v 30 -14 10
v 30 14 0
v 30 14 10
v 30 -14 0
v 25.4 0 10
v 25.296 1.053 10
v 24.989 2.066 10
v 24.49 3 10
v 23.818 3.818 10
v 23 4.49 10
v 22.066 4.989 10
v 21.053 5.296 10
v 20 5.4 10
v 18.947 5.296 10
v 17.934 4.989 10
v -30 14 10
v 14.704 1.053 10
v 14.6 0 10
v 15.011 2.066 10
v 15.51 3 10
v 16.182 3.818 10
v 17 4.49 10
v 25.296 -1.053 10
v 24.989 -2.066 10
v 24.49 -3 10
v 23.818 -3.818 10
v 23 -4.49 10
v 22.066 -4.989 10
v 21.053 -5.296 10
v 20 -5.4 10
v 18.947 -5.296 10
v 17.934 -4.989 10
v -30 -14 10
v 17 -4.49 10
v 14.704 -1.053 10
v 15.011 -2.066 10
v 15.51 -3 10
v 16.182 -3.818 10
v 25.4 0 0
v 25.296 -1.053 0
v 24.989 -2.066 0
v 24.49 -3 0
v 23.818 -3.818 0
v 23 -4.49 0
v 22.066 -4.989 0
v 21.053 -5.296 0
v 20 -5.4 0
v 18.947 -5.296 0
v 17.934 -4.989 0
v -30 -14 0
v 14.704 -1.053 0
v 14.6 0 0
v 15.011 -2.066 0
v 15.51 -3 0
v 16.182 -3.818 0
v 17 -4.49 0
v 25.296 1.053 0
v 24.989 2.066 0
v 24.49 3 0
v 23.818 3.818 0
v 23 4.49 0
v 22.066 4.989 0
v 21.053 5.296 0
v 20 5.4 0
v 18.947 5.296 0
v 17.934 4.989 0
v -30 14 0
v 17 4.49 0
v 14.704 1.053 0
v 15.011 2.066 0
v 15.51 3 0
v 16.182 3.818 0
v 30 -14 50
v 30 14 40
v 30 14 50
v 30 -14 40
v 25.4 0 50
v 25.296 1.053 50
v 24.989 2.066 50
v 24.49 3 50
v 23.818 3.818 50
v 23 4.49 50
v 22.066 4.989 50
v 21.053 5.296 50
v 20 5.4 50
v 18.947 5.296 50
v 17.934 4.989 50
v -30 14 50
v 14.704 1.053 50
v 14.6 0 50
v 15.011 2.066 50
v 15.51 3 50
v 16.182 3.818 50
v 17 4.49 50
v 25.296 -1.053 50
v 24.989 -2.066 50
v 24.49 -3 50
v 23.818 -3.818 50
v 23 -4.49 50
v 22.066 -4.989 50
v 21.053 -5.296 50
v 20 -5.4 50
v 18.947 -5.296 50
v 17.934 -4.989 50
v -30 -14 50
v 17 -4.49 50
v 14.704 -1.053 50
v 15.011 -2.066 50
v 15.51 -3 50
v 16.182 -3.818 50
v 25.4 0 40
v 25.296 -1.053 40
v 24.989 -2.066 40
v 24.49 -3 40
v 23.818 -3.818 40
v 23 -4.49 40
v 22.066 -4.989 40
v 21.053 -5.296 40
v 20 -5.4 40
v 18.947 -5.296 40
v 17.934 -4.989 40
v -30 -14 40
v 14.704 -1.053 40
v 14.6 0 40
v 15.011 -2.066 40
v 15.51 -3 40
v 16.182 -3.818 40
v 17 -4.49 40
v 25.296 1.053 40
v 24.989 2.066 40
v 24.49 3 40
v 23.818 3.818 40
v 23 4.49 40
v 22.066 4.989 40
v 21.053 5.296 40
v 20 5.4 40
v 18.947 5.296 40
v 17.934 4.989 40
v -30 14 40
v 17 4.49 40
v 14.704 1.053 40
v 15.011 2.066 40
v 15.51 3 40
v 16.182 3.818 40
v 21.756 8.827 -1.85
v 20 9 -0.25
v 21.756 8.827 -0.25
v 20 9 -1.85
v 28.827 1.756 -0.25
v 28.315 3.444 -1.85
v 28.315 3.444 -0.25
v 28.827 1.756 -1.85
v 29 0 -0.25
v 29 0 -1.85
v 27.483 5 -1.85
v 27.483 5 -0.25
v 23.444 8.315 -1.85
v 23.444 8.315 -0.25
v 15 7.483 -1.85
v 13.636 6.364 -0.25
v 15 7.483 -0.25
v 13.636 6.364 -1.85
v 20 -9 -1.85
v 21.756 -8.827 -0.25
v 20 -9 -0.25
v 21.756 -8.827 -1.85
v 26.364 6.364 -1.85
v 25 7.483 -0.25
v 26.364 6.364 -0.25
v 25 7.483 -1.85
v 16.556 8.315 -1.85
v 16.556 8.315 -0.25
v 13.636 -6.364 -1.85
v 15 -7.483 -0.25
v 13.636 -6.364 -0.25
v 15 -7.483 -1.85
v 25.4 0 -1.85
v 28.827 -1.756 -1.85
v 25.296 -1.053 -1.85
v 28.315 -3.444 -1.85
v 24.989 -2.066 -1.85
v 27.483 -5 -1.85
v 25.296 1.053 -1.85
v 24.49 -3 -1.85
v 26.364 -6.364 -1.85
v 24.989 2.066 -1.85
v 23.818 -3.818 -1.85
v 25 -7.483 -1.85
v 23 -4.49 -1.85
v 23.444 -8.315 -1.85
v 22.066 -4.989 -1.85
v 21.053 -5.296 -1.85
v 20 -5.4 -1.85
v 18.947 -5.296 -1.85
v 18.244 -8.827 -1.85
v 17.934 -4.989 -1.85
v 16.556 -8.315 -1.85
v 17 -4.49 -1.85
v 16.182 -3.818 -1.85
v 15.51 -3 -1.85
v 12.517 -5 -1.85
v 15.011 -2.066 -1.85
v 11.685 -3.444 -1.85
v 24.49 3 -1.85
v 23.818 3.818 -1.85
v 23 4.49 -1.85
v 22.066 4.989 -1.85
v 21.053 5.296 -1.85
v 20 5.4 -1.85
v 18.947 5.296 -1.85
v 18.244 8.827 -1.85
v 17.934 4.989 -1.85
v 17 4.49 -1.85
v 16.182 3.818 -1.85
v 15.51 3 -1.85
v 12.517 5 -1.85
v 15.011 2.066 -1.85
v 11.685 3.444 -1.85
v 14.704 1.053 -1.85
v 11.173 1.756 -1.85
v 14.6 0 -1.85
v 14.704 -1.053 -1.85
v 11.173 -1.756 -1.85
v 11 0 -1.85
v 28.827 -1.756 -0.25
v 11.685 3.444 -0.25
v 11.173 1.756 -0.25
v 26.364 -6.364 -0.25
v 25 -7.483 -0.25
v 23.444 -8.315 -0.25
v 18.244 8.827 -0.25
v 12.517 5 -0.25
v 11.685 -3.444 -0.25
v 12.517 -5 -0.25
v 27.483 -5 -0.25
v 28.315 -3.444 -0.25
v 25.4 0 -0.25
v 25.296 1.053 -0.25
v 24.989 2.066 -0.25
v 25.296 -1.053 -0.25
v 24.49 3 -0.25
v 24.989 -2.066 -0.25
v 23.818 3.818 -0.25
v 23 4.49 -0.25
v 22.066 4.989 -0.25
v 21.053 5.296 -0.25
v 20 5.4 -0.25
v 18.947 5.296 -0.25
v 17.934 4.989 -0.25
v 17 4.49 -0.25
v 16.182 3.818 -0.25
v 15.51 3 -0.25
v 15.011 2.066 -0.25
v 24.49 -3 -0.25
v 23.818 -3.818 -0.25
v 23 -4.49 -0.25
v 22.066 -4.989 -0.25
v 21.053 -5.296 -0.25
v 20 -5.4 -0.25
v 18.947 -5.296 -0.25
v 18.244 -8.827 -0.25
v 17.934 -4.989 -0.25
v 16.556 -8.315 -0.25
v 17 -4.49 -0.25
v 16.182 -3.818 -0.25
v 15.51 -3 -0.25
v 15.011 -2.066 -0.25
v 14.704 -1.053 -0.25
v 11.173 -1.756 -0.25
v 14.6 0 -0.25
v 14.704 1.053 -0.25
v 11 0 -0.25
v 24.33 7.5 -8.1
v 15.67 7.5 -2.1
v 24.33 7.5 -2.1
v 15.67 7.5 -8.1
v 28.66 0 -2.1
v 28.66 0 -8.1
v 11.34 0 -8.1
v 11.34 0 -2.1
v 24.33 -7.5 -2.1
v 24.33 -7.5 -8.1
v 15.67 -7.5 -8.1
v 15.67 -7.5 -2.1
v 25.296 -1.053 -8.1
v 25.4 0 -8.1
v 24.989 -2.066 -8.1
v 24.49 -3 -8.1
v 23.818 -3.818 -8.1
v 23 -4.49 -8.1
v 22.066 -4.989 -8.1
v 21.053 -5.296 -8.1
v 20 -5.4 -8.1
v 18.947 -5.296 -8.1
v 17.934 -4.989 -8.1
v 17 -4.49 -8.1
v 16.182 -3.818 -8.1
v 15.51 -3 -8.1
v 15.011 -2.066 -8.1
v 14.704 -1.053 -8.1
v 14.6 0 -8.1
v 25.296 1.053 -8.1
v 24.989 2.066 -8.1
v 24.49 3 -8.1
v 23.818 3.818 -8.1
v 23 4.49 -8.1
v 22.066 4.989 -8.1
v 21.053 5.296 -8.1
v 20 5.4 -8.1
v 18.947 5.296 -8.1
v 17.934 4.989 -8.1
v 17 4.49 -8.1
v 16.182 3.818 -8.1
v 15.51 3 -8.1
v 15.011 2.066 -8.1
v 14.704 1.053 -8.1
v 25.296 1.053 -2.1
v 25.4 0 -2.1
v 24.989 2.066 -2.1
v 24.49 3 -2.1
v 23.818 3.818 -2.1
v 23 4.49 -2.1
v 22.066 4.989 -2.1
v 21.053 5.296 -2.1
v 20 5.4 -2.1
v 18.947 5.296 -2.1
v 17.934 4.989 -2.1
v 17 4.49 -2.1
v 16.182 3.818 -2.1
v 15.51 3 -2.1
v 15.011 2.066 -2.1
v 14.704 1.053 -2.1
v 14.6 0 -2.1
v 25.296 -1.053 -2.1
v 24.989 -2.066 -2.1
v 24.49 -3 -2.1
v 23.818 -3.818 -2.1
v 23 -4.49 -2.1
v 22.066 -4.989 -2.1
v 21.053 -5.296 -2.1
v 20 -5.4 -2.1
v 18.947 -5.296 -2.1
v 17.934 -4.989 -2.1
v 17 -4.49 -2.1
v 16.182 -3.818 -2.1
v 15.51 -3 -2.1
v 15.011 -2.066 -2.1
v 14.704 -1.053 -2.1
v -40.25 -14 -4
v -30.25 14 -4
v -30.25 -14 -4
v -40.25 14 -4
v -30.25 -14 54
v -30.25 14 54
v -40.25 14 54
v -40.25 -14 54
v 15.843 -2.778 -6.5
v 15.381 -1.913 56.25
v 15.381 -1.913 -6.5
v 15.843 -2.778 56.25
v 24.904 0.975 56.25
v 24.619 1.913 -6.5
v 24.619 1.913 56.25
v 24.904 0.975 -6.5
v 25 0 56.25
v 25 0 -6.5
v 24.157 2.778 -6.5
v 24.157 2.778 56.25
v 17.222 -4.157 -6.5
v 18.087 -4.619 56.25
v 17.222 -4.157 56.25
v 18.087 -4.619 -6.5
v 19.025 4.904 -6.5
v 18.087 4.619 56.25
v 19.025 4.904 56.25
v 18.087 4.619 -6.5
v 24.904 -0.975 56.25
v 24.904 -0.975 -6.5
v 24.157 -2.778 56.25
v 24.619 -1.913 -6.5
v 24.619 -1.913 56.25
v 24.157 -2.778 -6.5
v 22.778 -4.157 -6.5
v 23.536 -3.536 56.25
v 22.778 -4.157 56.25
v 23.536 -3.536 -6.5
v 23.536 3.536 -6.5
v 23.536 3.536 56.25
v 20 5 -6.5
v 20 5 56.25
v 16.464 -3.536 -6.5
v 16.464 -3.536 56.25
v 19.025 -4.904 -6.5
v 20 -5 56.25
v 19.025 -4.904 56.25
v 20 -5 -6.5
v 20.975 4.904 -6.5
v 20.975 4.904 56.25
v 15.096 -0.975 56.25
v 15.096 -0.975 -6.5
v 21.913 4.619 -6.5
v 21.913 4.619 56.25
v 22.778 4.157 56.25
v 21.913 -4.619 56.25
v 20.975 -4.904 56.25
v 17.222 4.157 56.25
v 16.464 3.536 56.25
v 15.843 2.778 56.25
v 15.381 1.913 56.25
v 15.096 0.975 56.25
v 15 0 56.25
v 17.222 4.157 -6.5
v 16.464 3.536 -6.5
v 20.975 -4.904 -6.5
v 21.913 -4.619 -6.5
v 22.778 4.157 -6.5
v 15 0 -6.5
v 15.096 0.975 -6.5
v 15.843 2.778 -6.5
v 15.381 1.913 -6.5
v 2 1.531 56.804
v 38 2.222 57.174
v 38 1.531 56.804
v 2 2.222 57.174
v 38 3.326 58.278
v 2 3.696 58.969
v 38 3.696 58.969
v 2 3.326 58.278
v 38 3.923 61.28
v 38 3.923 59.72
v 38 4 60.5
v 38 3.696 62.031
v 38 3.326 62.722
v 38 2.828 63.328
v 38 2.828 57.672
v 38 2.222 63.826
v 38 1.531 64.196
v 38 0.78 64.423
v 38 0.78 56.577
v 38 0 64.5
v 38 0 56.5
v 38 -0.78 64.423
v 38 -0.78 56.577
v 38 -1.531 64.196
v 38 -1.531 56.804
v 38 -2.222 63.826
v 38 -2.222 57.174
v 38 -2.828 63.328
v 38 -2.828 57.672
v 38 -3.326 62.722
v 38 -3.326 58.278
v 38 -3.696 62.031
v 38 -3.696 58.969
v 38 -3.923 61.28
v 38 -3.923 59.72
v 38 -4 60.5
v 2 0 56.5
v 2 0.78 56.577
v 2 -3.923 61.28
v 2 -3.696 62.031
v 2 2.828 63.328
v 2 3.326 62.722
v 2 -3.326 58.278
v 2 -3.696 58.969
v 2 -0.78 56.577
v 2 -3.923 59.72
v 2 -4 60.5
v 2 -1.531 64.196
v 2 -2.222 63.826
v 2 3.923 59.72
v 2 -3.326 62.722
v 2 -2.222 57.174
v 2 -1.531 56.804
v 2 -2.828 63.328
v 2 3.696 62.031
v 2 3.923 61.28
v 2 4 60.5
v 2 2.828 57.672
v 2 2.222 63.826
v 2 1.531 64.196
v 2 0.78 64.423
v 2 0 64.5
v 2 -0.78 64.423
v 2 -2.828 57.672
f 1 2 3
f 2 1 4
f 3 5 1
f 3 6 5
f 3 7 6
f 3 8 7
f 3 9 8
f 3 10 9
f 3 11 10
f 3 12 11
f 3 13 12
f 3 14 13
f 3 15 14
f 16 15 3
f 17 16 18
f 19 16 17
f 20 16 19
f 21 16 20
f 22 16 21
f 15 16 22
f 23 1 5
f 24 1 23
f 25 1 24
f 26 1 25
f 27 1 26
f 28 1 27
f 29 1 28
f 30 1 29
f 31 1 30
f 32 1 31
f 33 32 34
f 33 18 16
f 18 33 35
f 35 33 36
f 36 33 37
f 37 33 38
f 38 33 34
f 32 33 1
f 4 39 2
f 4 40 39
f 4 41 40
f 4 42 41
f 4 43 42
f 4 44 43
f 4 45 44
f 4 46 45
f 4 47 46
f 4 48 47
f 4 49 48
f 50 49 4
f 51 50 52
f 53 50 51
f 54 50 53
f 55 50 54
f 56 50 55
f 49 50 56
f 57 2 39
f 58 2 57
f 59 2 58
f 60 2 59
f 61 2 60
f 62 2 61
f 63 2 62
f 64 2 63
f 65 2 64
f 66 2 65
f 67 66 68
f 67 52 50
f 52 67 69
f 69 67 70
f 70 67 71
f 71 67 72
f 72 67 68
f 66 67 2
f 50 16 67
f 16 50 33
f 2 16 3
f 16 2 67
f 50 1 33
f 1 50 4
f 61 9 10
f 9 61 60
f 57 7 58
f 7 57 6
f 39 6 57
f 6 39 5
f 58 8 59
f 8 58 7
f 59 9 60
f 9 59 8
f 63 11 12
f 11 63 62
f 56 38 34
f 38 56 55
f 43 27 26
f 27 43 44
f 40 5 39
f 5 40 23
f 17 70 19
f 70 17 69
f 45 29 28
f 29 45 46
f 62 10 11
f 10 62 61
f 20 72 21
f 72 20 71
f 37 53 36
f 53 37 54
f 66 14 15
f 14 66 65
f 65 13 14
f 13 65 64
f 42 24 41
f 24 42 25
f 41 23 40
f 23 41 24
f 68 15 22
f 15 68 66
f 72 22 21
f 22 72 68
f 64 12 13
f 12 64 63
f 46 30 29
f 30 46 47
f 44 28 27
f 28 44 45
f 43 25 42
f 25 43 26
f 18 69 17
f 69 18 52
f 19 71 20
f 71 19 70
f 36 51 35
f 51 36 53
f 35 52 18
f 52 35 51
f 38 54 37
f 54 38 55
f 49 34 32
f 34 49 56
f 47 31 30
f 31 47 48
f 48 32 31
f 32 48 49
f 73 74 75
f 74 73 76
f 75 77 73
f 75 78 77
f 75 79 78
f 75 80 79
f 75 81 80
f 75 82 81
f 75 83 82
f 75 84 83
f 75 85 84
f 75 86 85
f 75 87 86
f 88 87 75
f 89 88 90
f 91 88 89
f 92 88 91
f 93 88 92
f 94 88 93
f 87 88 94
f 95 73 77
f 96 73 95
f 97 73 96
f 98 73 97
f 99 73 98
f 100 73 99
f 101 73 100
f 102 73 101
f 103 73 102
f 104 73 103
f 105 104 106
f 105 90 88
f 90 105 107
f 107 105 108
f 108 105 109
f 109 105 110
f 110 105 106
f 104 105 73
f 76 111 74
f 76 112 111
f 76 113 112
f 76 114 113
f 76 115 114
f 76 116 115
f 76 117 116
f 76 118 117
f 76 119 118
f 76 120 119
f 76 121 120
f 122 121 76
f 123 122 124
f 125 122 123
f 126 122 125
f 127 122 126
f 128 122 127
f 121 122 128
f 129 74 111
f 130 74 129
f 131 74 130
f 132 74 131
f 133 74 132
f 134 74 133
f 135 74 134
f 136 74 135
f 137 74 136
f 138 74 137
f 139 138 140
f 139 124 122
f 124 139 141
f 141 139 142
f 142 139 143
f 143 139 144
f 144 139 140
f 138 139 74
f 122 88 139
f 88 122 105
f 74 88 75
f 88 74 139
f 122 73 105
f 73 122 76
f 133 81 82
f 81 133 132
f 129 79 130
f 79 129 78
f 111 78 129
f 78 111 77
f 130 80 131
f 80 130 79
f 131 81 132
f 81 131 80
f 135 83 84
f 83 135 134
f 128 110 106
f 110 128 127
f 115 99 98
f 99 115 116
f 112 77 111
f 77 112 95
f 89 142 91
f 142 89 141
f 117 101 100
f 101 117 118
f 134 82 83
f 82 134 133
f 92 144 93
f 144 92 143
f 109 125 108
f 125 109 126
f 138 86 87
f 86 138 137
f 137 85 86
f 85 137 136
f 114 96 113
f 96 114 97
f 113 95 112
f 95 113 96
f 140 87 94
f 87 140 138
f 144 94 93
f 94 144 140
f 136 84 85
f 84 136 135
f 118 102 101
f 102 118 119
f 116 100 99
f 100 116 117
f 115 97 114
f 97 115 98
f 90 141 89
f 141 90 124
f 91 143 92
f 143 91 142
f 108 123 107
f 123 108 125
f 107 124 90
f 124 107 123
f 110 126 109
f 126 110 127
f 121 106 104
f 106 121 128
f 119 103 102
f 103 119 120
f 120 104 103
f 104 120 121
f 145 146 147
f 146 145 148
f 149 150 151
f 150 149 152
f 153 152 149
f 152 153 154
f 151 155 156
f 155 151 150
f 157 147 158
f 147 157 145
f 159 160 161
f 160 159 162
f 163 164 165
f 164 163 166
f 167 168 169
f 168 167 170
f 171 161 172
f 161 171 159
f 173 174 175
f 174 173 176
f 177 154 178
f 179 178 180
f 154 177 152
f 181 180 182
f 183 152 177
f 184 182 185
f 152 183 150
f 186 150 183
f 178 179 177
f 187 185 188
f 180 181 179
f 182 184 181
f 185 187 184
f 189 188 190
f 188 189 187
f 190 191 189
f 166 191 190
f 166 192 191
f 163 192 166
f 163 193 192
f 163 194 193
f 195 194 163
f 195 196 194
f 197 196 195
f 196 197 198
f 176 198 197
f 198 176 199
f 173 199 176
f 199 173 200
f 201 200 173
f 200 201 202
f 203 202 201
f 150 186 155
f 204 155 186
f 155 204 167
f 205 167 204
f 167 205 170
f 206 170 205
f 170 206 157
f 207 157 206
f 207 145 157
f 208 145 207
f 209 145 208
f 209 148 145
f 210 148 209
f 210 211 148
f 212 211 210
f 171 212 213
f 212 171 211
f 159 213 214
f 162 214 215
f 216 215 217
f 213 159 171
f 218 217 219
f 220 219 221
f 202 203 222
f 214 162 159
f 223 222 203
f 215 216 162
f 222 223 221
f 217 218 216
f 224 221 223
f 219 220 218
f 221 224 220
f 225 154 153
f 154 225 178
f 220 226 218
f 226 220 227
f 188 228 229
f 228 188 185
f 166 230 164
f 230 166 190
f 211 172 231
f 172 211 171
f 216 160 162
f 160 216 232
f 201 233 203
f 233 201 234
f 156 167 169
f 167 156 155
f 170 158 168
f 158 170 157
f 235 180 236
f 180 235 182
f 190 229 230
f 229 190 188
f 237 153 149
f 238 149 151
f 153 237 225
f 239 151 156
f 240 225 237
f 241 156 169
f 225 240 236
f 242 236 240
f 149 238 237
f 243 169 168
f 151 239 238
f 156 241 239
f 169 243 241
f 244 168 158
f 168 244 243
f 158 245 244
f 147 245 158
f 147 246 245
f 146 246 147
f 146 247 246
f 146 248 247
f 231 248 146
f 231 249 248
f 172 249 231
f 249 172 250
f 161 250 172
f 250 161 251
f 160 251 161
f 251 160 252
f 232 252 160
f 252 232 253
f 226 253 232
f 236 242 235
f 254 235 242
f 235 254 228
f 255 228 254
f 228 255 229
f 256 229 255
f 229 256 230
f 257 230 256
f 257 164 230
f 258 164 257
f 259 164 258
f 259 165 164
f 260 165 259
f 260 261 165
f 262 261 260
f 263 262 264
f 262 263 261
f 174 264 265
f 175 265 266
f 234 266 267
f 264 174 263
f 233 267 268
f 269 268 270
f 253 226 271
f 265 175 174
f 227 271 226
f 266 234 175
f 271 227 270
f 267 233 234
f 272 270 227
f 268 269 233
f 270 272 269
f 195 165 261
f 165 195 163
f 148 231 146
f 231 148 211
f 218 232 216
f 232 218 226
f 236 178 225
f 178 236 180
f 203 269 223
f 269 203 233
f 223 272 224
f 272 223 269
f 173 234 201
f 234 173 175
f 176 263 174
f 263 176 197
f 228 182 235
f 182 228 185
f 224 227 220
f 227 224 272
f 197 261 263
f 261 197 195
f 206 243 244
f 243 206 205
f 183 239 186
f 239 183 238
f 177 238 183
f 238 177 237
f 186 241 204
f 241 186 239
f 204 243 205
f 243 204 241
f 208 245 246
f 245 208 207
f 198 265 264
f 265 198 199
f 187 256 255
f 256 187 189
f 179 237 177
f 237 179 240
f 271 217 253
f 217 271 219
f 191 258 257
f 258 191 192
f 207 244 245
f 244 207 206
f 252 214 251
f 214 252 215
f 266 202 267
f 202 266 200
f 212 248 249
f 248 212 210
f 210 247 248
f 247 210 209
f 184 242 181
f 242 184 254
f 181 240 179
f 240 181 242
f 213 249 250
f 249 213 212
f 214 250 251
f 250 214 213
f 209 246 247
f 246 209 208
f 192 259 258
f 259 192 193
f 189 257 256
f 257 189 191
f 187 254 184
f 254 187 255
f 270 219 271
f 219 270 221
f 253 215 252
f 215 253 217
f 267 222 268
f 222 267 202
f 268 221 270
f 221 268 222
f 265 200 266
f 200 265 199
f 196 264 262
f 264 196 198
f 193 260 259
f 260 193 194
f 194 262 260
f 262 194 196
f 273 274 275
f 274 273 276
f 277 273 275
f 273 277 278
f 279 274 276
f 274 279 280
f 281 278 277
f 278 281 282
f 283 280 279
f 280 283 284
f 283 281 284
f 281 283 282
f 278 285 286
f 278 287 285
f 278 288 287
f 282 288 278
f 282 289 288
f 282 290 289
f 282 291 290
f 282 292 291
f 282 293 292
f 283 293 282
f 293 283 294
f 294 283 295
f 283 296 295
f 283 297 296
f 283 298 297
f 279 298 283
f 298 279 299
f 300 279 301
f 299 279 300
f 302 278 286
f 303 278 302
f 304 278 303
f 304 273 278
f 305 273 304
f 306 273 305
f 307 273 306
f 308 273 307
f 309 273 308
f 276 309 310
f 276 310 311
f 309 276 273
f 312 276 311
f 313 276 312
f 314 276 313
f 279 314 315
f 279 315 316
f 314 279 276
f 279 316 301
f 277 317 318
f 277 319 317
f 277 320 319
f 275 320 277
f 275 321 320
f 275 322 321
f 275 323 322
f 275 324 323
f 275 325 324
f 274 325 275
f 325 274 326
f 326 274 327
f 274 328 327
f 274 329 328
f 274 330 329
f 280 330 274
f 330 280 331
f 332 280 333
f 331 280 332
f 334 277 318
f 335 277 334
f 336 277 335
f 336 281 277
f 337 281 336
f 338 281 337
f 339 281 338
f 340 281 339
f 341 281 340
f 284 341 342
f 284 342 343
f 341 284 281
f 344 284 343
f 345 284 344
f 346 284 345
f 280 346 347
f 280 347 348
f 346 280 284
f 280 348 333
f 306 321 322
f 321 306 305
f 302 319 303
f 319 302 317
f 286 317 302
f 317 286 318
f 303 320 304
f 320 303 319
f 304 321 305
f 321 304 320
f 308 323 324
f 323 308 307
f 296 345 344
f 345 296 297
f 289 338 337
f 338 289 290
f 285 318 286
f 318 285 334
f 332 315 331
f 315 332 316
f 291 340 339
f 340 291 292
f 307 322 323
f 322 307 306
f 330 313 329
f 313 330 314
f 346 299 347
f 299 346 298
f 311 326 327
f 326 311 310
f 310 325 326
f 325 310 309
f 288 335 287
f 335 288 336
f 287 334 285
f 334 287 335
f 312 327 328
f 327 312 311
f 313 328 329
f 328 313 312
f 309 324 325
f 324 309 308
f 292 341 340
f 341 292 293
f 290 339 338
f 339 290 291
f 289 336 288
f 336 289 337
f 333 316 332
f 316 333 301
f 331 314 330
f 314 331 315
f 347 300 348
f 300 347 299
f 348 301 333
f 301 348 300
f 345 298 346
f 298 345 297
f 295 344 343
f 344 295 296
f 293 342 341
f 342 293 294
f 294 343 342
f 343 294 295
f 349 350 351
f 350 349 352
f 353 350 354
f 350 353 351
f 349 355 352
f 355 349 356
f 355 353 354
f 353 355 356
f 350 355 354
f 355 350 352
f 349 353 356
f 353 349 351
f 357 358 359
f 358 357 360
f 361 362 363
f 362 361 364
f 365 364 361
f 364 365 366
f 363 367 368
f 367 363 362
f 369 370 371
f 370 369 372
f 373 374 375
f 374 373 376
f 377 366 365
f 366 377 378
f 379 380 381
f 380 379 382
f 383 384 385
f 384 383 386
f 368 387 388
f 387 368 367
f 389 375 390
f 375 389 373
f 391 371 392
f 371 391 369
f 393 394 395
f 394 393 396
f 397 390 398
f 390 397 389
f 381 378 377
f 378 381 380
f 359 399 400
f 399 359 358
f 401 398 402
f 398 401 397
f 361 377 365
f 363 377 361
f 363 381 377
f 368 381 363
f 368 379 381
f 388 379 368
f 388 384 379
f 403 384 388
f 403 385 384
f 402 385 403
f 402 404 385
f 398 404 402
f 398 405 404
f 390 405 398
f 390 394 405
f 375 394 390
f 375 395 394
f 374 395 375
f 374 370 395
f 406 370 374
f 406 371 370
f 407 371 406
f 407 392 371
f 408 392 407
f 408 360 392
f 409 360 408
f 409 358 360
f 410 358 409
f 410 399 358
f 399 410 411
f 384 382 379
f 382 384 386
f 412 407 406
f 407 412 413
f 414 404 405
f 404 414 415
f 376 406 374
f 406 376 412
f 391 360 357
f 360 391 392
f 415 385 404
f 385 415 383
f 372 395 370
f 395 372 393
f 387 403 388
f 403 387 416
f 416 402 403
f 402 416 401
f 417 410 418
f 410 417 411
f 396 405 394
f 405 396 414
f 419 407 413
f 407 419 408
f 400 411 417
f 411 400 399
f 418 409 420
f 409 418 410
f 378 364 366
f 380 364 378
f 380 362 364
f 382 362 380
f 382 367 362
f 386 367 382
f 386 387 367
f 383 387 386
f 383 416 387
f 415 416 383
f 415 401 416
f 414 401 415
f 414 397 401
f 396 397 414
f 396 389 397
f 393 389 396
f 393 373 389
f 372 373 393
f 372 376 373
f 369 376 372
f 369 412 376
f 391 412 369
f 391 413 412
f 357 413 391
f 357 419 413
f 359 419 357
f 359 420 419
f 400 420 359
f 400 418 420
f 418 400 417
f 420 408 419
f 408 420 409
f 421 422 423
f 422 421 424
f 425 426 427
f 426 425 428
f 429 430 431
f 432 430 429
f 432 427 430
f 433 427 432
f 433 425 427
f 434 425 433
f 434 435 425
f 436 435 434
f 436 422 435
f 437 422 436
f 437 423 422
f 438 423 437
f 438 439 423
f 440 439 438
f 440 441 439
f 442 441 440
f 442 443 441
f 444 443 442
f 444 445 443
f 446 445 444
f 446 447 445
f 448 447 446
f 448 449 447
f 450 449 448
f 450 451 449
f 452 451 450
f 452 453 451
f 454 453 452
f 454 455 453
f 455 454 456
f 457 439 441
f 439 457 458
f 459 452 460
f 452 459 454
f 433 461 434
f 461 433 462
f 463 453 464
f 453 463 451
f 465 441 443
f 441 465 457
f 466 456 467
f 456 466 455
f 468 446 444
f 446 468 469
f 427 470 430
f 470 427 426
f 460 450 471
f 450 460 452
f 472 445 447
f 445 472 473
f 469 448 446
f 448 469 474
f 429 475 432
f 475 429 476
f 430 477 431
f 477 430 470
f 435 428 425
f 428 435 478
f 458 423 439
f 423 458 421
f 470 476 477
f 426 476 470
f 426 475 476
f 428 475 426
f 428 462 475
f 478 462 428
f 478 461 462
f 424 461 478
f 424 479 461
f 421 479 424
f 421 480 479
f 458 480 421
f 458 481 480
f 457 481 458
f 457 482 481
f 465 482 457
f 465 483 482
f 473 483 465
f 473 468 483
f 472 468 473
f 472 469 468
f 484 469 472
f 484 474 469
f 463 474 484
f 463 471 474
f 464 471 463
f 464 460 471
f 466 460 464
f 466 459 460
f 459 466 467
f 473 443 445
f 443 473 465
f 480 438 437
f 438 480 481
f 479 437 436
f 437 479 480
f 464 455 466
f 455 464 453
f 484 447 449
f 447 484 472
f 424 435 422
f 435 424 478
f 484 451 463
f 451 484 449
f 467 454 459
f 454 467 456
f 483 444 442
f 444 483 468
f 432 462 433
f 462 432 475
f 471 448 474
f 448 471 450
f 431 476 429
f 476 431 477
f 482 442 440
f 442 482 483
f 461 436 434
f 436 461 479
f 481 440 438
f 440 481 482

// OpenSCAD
$fn = 32;

// ------------------------------------------------------------------------
// C clamp: throat 40 mm, screw d10
// Every part is its own module, assembly() places every instance.
// ------------------------------------------------------------------------

// --- part 1 ---
module clamp_arm() {
  difference() {
    translate([-30, -14, 0]) cube([60, 28, 10]);
    translate([20, 0, -1]) cylinder(h = 12, d = 10.8);
  }
}

// --- part 2 ---
module clamp_spine() {
  difference() {
    translate([-29, -14, 0]) cube([58, 28, 10]);
  }
}

// --- part 3 ---
module clamp_screw() {
  translate([0, 0, -31.375]) cylinder(h = 62.75, d = 10);
}

// --- part 4 ---
module clamp_washer() {
  difference() {
      translate([0, 0, 0]) cylinder(h = 1.6, d = 18);
      translate([0, 0, -1]) cylinder(h = 3.6, d = 10.8);
    }
}

// --- part 5 ---
module clamp_nut() {
  difference() {
    linear_extrude(height = 6) polygon(points = [[8.66, 0], [4.33, 7.5], [-4.33, 7.5], [-8.66, 0], [-4.33, -7.5], [4.33, -7.5]]);
    translate([0, 0, -1]) cylinder(h = 8, d = 10.8);
  }
}

// --- part 6 ---
module tommy_bar() {
  translate([0, 0, -18]) cylinder(h = 36, d = 8);
}

// --- assembly ---
module assembly() {
  color([0.80, 0.24, 0.20]) translate([0, 0, 0]) rotate([0, 0, 0]) clamp_arm();
  color([0.20, 0.45, 0.75]) translate([0, 0, 40]) rotate([0, 0, 0]) clamp_arm();
  color([0.25, 0.62, 0.32]) translate([-40.25, 0, 25]) rotate([0, 90, 0]) clamp_spine();
  color([0.92, 0.70, 0.18]) translate([20, 0, 24.875]) rotate([0, 0, 0]) clamp_screw();
  color([0.58, 0.35, 0.70]) translate([20, 0, -1.85]) rotate([0, 0, 0]) clamp_washer();
  color([0.16, 0.66, 0.66]) translate([20, 0, -8.1]) rotate([0, 0, 0]) clamp_nut();
  color([0.85, 0.48, 0.18]) translate([20, 0, 60.5]) rotate([0, 90, 0]) tommy_bar();
}

assembly();
